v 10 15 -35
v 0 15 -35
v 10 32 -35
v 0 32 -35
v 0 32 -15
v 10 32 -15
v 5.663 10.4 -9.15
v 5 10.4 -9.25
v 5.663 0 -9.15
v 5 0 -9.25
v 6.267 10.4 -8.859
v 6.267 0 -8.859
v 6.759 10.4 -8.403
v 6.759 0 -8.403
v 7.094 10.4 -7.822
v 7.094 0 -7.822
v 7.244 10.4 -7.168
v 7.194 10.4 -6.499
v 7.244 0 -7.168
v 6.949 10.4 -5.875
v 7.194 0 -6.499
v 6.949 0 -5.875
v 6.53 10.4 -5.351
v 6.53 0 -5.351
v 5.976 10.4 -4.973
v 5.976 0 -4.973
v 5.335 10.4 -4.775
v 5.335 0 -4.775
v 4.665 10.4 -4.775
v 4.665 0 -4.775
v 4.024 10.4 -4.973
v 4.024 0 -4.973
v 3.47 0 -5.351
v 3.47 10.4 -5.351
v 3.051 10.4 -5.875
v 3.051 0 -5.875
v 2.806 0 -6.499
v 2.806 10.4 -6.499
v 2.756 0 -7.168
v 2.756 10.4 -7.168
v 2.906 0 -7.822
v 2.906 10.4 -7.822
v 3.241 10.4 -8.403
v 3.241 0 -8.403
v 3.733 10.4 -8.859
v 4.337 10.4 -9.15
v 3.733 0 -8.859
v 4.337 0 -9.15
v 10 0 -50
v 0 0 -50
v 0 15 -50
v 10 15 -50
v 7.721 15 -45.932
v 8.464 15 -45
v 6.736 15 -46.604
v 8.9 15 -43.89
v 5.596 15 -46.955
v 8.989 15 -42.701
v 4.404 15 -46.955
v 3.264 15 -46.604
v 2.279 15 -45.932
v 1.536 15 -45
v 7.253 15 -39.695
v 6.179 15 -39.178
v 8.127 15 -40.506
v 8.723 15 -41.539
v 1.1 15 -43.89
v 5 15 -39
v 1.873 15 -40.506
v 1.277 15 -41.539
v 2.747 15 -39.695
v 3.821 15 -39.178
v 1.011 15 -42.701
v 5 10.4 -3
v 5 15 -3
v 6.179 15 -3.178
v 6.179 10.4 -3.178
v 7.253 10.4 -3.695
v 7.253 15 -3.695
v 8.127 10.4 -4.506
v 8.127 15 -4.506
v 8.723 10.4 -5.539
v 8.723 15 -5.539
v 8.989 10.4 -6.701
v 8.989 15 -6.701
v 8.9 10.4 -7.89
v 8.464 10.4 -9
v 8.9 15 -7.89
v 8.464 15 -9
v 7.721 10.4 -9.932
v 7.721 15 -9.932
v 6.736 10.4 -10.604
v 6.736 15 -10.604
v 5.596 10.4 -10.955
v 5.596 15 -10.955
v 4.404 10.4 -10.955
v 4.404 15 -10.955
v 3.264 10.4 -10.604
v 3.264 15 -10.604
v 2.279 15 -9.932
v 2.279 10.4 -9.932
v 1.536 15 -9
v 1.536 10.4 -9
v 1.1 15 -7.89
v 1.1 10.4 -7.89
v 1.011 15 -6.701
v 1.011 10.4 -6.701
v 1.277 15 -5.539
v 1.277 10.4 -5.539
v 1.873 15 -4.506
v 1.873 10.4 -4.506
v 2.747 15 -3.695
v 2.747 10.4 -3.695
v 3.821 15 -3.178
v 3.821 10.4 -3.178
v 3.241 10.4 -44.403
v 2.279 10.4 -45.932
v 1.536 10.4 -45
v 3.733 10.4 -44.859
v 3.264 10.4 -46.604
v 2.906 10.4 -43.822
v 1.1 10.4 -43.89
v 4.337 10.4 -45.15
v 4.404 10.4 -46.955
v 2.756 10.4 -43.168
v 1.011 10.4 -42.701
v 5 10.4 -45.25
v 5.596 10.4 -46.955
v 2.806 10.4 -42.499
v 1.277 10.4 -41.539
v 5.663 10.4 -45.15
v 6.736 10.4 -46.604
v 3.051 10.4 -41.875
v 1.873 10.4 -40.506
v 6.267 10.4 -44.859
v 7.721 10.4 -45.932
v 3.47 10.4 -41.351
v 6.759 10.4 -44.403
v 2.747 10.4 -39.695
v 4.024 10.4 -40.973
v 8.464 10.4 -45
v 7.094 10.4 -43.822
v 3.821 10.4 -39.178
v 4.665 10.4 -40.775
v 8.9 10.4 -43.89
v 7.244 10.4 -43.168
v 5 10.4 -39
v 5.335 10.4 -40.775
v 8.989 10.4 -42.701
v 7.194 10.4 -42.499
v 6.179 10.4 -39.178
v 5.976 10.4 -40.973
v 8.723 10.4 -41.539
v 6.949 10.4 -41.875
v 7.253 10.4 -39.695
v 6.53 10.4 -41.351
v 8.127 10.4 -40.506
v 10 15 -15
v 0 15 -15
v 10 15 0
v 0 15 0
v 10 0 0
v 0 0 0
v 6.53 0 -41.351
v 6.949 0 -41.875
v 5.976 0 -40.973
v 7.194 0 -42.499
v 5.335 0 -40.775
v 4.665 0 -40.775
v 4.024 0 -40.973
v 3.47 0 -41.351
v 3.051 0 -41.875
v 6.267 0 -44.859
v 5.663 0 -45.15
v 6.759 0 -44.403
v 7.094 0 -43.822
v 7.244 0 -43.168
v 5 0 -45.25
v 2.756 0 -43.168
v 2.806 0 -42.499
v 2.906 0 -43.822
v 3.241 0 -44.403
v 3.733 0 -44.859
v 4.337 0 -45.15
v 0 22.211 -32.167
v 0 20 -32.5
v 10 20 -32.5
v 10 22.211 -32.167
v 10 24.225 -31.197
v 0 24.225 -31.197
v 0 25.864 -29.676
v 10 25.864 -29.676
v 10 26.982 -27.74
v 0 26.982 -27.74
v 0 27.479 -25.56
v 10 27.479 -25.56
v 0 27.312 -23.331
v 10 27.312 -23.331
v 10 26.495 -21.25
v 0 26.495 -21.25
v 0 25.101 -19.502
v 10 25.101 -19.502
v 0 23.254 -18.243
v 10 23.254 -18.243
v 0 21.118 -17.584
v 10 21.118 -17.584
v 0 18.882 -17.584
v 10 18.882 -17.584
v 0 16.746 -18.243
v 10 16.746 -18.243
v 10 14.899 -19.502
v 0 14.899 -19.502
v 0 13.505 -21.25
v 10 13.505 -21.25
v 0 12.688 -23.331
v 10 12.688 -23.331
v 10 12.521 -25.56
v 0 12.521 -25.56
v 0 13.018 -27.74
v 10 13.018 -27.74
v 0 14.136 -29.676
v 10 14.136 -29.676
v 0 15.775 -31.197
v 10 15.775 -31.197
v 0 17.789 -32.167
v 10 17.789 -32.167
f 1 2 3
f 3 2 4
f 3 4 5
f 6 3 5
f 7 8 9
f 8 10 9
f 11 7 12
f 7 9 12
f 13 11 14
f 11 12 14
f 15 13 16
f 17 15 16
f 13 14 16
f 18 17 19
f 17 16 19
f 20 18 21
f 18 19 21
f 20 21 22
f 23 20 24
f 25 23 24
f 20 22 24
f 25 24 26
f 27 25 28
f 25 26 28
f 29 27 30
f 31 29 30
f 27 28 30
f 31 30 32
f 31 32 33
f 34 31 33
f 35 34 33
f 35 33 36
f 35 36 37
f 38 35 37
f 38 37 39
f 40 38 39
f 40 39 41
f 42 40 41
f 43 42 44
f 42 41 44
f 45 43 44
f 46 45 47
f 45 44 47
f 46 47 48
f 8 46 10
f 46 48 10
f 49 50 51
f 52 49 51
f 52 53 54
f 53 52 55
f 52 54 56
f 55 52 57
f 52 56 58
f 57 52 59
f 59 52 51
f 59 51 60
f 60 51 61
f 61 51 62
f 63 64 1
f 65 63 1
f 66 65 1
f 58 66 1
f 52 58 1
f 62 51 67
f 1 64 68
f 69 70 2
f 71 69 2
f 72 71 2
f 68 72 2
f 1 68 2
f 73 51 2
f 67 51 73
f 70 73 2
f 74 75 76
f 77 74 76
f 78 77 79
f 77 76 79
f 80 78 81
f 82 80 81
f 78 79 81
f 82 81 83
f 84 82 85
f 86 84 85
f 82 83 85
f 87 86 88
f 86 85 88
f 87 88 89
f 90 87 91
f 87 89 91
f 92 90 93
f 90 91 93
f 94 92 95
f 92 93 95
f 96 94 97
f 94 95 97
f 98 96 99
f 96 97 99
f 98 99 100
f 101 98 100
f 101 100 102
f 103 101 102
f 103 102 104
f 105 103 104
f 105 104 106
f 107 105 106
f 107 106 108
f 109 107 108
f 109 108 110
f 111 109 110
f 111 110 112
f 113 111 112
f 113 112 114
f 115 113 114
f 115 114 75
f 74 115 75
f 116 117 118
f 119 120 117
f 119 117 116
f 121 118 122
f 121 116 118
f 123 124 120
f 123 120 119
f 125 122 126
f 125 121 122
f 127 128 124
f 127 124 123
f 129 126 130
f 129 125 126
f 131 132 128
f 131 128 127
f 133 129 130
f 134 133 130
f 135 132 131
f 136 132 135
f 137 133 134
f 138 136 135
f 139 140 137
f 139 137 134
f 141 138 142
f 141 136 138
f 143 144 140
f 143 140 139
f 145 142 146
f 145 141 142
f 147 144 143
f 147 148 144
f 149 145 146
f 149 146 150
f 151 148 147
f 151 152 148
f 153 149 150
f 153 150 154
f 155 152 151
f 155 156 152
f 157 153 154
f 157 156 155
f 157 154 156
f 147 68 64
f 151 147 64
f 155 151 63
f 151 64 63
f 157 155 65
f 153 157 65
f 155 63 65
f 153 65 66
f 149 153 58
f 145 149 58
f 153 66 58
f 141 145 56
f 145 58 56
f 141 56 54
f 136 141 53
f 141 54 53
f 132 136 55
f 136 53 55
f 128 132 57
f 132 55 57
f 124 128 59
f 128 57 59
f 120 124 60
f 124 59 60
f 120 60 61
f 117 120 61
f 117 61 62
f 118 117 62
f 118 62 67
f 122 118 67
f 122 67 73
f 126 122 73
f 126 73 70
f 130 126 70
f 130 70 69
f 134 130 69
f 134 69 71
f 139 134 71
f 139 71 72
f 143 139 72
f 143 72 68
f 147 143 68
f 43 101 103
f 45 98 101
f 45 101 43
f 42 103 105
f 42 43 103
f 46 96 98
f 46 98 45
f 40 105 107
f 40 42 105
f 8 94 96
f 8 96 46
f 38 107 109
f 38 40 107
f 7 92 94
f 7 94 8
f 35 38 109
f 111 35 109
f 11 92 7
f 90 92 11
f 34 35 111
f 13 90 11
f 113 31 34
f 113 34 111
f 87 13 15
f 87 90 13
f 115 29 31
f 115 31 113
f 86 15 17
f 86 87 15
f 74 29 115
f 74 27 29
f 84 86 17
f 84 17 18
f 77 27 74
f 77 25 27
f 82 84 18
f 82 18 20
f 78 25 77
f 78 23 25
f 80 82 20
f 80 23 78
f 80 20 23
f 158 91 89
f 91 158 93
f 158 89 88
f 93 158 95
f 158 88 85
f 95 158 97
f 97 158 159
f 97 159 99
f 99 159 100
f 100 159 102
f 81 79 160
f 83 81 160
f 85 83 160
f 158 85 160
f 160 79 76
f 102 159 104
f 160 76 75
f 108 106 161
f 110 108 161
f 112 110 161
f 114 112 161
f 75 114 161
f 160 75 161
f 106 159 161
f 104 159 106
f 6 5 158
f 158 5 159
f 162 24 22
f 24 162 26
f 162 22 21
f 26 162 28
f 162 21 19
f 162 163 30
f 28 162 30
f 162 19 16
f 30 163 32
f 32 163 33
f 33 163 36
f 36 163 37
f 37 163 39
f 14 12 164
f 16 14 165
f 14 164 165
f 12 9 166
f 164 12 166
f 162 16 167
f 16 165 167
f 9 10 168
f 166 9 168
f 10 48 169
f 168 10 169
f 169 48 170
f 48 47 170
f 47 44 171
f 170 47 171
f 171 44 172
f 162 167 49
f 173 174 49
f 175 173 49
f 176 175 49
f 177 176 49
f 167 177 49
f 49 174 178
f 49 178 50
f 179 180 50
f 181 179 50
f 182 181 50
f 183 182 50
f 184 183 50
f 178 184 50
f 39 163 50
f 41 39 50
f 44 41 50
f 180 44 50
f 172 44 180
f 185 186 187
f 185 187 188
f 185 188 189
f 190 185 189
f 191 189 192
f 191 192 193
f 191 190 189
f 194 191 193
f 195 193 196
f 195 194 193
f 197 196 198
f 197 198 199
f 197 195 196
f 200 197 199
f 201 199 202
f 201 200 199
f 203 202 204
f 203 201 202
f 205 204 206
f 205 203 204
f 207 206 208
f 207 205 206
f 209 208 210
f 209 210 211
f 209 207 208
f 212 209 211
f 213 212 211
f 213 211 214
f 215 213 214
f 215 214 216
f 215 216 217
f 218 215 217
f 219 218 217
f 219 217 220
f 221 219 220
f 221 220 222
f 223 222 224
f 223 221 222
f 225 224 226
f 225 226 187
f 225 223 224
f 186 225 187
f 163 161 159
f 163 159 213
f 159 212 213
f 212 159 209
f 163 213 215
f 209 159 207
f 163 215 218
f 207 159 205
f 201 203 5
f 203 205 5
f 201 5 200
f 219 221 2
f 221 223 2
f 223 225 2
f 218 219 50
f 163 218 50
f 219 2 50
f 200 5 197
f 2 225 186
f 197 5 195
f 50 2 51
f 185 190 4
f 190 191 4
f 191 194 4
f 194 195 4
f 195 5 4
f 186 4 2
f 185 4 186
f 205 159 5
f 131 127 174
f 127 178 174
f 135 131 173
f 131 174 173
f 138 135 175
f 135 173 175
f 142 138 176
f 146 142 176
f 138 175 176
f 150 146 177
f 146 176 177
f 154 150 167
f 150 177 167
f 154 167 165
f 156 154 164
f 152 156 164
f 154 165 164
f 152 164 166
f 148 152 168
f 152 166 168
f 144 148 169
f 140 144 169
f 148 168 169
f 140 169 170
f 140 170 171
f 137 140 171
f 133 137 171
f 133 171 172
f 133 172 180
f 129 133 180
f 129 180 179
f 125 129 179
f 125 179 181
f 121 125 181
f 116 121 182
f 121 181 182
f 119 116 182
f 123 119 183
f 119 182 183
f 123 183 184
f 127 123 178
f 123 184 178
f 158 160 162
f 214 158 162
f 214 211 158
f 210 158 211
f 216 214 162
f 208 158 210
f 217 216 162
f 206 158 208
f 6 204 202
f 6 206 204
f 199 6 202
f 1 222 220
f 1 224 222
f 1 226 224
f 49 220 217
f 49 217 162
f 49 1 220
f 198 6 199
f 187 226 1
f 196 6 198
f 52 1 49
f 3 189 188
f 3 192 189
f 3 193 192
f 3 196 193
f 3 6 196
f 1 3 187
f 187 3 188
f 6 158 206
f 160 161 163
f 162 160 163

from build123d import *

# Parameters (mm, degrees)
SKETCH_1_R                   = 7.5
EXTRUDE_1_DEPTH              = 10
HOLE_WIZARD_M4_1_D           = 4.5
HOLE_WIZARD_M4_1_CBORE_D     = 8
HOLE_WIZARD_M4_1_CBORE_DEPTH = 4.6


with BuildPart() as part:
    # 草图1 → 凸台-拉伸1 (new body)
    with BuildSketch(Plane(origin=(0, 0, 0), x_dir=(0, 0, -1), z_dir=(1, 0, 0))):
        Polygon((0, 0), (50, 0), (50, 15), (35, 15), (35, 32), (15, 32), (15, 15), (0, 15), align=None)
        with Locations((25, 20)):
            Circle(SKETCH_1_R, mode=Mode.SUBTRACT)
    extrude(amount=EXTRUDE_1_DEPTH)

    # M4 六角圆柱头螺钉的柱形沉头孔1 (through all)
    with Locations(Plane(origin=(5, 15, -43), x_dir=(0, 0, 1), z_dir=(0, 1, 0))):
        with Locations((0, 0), (36, 0)):
            CounterBoreHole(HOLE_WIZARD_M4_1_D / 2, HOLE_WIZARD_M4_1_CBORE_D / 2, HOLE_WIZARD_M4_1_CBORE_DEPTH)


solid = part.part
